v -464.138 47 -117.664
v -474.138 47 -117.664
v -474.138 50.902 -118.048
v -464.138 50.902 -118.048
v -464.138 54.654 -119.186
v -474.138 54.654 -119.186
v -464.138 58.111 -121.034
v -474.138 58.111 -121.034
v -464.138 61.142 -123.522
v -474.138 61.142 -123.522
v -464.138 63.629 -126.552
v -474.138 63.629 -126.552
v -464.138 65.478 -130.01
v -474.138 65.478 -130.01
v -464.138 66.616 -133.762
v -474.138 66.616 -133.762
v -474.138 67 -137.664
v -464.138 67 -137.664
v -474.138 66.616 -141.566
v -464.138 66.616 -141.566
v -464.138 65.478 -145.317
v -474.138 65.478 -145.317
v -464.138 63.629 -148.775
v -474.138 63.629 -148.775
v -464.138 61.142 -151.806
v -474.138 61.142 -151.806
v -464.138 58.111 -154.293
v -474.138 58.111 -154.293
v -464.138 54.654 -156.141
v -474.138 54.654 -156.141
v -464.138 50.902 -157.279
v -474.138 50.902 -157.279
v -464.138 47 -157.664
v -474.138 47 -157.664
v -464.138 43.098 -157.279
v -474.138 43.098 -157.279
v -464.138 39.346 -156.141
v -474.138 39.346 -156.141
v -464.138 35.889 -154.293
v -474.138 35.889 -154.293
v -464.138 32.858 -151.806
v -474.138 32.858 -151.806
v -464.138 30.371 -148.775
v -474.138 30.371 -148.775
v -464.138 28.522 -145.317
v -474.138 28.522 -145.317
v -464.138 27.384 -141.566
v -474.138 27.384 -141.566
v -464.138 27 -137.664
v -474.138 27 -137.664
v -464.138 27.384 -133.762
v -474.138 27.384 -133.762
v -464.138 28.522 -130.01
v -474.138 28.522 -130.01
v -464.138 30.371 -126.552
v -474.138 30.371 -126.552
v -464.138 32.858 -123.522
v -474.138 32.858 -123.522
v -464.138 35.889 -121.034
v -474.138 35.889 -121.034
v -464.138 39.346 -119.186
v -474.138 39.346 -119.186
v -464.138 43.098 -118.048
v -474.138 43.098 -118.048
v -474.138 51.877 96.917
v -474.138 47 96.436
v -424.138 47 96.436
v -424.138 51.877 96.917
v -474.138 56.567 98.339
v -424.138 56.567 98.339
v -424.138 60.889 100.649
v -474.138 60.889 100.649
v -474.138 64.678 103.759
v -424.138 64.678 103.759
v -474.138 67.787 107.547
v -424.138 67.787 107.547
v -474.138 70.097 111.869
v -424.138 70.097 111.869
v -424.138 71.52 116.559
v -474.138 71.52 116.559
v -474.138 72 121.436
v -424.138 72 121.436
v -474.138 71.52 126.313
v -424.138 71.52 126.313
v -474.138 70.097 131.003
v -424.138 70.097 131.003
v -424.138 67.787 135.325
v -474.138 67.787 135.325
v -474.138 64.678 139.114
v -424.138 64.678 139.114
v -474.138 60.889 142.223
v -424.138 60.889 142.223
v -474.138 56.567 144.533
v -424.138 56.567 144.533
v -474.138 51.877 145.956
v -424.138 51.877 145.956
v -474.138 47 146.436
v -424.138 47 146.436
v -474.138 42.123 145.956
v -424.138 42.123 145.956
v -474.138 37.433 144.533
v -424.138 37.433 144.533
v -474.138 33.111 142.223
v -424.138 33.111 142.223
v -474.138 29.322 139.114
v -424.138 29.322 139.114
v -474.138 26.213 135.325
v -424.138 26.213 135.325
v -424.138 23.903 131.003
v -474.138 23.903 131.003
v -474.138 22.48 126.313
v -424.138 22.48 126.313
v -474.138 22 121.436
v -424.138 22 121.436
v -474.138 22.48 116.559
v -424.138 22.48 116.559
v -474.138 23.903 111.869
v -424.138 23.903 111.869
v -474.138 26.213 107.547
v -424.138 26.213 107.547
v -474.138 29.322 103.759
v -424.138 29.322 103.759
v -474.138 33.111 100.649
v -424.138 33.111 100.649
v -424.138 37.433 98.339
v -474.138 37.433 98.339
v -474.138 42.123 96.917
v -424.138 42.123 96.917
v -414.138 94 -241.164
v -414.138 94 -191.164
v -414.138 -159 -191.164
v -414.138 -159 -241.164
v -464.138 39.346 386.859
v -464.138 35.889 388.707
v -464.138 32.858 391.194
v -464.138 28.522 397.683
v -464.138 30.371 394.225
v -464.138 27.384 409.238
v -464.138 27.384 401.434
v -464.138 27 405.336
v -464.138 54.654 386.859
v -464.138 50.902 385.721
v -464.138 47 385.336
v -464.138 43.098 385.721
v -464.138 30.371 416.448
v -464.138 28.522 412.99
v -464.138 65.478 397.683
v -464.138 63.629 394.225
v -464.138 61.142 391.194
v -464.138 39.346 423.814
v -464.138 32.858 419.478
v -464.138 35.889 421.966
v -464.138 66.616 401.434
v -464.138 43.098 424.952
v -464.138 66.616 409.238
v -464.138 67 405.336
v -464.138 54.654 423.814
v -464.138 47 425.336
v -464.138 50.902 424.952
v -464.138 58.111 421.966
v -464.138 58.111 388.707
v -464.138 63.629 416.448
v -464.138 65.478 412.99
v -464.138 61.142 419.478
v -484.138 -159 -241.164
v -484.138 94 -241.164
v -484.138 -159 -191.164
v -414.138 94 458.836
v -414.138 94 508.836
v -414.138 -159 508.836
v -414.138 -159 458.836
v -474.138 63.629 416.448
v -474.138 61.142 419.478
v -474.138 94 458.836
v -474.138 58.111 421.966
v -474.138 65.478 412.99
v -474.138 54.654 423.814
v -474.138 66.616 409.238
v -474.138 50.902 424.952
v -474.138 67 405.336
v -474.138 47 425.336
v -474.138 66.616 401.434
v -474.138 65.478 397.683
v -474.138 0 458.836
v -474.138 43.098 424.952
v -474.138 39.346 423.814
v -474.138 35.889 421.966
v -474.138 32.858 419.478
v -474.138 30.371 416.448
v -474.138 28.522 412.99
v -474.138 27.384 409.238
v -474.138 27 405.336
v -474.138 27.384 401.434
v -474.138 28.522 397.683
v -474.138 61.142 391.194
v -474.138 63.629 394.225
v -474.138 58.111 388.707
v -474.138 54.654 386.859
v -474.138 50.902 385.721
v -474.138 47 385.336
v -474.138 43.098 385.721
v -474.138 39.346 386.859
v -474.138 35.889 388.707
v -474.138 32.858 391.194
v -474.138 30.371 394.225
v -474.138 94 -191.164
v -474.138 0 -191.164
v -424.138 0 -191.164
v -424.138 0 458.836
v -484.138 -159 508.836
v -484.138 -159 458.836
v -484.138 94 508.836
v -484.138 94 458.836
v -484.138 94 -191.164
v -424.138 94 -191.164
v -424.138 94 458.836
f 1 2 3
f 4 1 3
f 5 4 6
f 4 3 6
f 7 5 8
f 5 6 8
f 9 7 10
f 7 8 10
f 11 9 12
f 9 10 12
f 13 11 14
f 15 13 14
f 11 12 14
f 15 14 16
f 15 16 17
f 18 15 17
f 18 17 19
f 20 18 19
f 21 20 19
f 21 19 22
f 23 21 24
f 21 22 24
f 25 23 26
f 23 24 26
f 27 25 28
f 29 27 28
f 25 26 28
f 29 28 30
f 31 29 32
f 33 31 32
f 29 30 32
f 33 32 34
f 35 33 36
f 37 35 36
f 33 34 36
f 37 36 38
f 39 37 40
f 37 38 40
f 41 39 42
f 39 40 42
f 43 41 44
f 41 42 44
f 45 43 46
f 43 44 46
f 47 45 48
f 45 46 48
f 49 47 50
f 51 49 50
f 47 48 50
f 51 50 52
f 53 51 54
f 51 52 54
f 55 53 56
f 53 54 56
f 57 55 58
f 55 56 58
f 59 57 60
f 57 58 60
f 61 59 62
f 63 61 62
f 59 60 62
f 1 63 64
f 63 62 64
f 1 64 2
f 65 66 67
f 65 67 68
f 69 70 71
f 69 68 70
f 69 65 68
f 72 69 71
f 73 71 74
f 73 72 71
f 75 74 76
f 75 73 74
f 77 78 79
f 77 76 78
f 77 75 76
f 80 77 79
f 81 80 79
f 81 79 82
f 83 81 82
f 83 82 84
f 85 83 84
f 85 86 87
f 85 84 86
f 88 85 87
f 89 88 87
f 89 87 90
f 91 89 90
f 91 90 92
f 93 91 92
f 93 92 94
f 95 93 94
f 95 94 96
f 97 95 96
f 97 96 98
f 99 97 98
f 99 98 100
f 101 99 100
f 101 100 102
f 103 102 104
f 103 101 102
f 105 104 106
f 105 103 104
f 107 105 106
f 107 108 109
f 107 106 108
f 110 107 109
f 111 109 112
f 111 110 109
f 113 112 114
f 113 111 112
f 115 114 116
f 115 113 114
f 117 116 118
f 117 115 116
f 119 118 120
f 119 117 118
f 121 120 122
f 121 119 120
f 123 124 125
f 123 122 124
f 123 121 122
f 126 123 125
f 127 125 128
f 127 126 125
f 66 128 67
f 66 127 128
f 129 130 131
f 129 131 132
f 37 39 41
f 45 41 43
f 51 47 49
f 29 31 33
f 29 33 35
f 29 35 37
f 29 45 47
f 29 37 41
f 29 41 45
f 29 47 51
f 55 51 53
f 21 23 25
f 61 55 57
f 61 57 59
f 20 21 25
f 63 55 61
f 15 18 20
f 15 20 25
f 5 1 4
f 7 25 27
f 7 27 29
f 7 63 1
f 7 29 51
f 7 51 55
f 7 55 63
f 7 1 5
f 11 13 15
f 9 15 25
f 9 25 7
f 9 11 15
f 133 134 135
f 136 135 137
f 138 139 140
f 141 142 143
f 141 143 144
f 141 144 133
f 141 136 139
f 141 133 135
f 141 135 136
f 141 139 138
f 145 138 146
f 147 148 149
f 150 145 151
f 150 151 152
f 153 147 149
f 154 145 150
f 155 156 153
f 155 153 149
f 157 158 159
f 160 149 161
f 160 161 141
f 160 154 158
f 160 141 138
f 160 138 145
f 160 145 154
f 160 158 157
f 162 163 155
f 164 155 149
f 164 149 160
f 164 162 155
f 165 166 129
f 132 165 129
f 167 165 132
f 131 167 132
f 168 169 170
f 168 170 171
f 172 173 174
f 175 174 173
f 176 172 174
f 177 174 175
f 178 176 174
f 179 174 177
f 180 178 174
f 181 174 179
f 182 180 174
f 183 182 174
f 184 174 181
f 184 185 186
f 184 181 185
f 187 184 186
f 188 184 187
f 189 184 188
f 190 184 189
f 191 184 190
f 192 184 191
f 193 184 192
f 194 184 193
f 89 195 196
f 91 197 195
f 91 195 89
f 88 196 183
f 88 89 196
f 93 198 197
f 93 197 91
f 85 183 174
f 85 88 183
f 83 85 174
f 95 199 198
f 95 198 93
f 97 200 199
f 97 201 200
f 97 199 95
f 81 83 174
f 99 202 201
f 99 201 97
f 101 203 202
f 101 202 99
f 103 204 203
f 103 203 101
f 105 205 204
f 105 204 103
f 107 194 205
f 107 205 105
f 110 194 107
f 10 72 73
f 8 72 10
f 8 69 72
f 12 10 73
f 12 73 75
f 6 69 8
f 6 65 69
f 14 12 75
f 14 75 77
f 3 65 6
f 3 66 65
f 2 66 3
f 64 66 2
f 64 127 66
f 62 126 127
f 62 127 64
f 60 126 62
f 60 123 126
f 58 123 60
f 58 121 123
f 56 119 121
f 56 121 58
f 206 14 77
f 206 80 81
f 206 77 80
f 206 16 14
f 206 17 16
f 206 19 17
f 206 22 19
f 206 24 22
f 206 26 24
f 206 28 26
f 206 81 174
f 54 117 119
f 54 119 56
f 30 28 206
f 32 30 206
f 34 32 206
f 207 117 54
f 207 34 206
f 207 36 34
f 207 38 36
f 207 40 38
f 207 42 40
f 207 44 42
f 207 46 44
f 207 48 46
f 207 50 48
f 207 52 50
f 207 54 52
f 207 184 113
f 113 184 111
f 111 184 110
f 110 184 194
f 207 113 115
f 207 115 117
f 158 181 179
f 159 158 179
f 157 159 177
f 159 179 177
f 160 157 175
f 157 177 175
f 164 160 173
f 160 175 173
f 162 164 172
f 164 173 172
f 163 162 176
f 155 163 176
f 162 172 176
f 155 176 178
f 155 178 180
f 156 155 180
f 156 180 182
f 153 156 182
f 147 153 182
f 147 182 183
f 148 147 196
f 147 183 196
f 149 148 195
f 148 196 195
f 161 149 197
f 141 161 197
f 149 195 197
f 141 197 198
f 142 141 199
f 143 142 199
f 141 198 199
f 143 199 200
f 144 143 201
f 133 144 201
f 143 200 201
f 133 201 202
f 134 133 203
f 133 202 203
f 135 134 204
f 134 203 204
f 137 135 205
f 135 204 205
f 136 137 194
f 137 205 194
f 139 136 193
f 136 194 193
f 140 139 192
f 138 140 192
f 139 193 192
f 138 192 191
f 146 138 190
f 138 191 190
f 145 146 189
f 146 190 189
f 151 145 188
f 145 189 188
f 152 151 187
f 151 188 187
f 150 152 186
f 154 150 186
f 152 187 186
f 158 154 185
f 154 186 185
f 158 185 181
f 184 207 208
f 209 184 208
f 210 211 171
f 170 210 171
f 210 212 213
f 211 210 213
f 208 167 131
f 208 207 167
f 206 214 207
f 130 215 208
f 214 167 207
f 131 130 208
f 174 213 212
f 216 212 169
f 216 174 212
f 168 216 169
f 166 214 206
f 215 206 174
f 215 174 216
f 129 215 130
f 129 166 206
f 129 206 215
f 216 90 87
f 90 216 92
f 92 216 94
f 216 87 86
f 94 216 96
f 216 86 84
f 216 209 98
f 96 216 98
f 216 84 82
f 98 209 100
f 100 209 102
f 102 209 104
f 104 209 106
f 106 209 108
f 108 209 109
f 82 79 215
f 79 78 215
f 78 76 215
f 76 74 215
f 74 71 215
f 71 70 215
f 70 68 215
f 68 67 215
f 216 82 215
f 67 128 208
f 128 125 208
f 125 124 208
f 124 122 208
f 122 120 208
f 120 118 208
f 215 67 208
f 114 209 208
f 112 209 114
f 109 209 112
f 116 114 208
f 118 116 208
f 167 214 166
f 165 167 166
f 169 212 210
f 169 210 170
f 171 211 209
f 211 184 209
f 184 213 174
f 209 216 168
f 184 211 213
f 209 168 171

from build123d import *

# Parameters (mm, degrees)
SKETCH1_W               = 50
SKETCH1_H               = 750
BOSS_EXTRUDE1_DEPTH     = 94
SKETCH2_W               = 70
SKETCH2_H               = 50
BOSS_EXTRUDE2_DEPTH     = 253
SKETCH3_R               = 20
CUT_EXTRUDE1_DEPTH      = 10
CUT_EXTRUDE2_DEPTH      = 537.465549172
CUT_EXTRUDE2_DEPTH_BACK = 537.465549172
SKETCH4_R               = 25


with BuildPart() as part:
    # Sketch1 → Boss-Extrude1 (new body)
    with BuildSketch(Plane(origin=(0, 0, 0), x_dir=(1, 0, 0), z_dir=(0, 1, 0))):
        with Locations((-449.137931034, -133.836206897)):
            Rectangle(SKETCH1_W, SKETCH1_H)
    extrude(amount=BOSS_EXTRUDE1_DEPTH)

    # Sketch2 → Boss-Extrude2 (add)
    with BuildSketch(Plane(origin=(0, 94, 0), x_dir=(1, 0, 0), z_dir=(0, 1, 0))):
        with Locations((-449.137931034, 216.163793103)):
            Rectangle(SKETCH2_W, SKETCH2_H)
        with Locations((-449.137931034, -483.836206897)):
            Rectangle(SKETCH2_W, SKETCH2_H)
    extrude(amount=-BOSS_EXTRUDE2_DEPTH)

    # Sketch3 → Cut-Extrude1 (cut)
    with BuildSketch(Plane.ZY.offset(474.137931034)):
        with Locations((-137.663793103, 47)):
            Circle(SKETCH3_R)
        with Locations((405.336206897, 47)):
            Circle(SKETCH3_R)
    extrude(amount=-CUT_EXTRUDE1_DEPTH, mode=Mode.SUBTRACT)

    # Sketch4 → Cut-Extrude2 (cut, two sides: drawn at the far end of the back side and taken through both)
    with BuildSketch(Plane(origin=(-424.137931034, 0, 0), x_dir=(0, 0, -1), z_dir=(1, 0, 0)).offset(-CUT_EXTRUDE2_DEPTH_BACK)):
        with Locations((-121.436206897, 47)):
            Circle(SKETCH4_R)
    extrude(amount=CUT_EXTRUDE2_DEPTH + CUT_EXTRUDE2_DEPTH_BACK, mode=Mode.SUBTRACT)


solid = part.part
